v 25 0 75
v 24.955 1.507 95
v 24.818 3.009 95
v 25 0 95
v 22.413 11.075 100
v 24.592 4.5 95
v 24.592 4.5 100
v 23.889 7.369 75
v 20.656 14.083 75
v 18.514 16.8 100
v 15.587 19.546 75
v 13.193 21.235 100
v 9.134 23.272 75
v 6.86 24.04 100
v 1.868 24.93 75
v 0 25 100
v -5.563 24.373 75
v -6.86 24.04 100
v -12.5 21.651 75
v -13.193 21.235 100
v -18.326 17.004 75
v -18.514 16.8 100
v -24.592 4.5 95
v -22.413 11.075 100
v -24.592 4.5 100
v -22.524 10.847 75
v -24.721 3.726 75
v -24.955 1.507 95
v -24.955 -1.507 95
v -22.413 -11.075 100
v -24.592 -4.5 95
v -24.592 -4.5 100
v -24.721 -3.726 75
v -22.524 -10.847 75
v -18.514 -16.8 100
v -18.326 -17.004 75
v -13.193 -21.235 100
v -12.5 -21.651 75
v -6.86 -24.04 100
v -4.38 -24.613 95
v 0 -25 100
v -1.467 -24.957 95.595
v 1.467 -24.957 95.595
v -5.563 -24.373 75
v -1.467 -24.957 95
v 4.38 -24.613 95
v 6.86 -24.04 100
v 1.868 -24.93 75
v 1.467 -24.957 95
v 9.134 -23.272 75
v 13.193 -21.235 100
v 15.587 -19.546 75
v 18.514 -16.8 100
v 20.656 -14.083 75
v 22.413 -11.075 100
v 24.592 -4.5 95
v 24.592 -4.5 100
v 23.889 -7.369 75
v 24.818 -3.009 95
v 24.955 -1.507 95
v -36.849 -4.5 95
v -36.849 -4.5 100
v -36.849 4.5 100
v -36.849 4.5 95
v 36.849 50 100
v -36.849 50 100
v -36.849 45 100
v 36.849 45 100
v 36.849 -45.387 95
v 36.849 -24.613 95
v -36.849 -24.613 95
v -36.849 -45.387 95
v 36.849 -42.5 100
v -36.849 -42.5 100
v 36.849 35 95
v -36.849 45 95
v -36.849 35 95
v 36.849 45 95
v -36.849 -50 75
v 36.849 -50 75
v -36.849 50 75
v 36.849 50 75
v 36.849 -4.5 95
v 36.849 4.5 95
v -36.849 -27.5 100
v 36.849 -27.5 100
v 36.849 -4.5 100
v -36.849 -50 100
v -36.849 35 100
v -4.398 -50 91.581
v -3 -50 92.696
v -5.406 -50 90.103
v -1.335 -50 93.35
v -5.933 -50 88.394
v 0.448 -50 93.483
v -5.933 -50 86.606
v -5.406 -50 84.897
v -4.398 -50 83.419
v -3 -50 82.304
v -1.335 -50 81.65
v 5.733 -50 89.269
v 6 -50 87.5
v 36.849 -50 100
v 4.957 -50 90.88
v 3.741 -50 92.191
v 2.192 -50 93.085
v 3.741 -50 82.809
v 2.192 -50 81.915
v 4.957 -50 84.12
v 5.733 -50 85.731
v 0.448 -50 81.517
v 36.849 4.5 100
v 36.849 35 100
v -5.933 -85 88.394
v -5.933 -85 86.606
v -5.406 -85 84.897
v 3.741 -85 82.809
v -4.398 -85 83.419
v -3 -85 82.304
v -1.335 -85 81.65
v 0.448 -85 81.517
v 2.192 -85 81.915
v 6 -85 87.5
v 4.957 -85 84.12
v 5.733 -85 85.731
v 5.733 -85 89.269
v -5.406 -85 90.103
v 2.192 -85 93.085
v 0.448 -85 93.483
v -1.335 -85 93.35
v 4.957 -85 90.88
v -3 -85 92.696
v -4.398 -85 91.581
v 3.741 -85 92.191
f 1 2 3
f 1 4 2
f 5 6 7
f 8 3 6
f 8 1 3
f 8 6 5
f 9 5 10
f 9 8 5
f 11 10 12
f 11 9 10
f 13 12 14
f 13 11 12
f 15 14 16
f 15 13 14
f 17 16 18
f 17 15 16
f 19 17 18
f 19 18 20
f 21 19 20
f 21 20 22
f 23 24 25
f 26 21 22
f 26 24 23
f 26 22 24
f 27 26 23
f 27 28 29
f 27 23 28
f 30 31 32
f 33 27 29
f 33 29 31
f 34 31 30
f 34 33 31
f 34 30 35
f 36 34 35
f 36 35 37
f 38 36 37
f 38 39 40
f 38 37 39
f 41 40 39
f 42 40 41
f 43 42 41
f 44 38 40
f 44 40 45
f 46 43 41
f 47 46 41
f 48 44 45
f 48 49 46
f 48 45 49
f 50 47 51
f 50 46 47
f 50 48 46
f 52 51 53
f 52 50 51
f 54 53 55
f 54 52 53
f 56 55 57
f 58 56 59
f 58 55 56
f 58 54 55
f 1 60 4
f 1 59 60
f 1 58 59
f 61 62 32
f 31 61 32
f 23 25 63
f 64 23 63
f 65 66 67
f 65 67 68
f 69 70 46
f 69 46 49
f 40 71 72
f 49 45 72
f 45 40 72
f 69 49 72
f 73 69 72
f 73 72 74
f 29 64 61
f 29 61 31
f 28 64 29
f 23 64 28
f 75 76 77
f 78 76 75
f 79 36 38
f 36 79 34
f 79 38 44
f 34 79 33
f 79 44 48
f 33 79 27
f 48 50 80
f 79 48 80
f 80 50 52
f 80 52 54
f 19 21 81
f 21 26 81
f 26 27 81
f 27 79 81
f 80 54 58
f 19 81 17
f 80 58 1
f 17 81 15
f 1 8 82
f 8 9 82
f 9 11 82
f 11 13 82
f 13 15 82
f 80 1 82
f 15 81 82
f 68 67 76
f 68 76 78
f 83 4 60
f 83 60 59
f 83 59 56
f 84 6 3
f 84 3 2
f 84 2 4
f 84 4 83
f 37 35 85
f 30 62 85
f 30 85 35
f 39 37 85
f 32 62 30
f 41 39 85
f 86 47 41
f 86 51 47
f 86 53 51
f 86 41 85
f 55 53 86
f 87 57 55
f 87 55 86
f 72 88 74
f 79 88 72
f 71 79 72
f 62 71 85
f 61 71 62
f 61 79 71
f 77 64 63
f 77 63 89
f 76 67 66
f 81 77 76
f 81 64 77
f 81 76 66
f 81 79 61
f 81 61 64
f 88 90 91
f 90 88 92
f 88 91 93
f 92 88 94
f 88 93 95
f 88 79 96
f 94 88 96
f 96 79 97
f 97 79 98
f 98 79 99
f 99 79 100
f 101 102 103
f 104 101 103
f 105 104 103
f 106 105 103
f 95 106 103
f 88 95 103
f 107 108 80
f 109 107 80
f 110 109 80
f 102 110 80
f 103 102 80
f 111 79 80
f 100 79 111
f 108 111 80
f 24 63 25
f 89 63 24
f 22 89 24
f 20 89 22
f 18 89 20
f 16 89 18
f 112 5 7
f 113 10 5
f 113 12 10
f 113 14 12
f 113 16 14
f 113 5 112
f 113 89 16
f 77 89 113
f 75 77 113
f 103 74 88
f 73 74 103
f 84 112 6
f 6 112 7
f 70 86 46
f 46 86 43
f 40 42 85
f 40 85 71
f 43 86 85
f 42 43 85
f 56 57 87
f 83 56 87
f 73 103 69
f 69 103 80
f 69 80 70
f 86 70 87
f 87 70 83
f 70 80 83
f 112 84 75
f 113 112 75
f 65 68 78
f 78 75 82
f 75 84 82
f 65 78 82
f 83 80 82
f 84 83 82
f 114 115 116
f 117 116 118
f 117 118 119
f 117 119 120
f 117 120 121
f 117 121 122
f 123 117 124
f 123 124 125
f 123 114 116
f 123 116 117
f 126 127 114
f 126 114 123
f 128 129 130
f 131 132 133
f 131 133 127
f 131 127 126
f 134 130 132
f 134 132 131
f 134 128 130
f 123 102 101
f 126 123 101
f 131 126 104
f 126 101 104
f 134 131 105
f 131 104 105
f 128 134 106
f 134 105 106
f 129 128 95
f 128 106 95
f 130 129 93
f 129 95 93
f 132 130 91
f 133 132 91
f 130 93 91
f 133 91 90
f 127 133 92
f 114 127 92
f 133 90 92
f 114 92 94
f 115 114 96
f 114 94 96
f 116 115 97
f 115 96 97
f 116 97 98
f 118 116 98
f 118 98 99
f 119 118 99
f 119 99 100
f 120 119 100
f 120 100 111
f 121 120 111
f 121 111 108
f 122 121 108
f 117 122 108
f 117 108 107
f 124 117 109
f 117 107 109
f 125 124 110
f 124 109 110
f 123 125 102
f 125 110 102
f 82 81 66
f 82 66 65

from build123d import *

# Parameters (mm, degrees)
F1_W      = 73.6989242806
F1_H      = 100
F1_R      = 25
F2_DEPTH  = 100
F3_W      = 73.6989242806
F3_H      = 10
F4_DEPTH  = 5
F6_DEPTH  = 73.6989242806
F0_W      = 73.6989242806
F0_H      = 100
F7_DEPTH  = 75
F8_DEPTH  = 75
F9_R      = 6
F10_DEPTH = 35


with BuildPart() as f2:
    # F1 (on face) → F2 (new body)
    with BuildSketch(Plane.XY):
        Rectangle(F1_W, F1_H)
        Circle(F1_R, mode=Mode.SUBTRACT)
    extrude(amount=F2_DEPTH)

    # F3 (on face) → F4 (cut)
    with BuildSketch(Plane.XY.offset(100)):
        with BuildLine():
            Line((-24.5916652547, 4.5), (-36.8494621403, 4.5))
            Line((-36.8494621403, 4.5), (-36.8494621403, -4.5))
            Line((-36.8494621403, -4.5), (-24.5916652547, -4.5))
            ThreePointArc((-24.5916652547, -4.5), (-25, 0), (-24.5916652547, 4.5))
        make_face()
        with BuildLine():
            Line((36.8494621403, -4.5), (36.8494621403, 4.5))
            Line((36.8494621403, 4.5), (24.5916652547, 4.5))
            ThreePointArc((24.5916652547, 4.5), (24.8977070367, 2.2592441913), (25, 0))
            ThreePointArc((25, 0), (24.8977070367, -2.2592441913), (24.5916652547, -4.5))
            Line((24.5916652547, -4.5), (36.8494621403, -4.5))
        make_face()
        with Locations((0, 40)):
            Rectangle(F3_W, F3_H)
    extrude(amount=-F4_DEPTH, mode=Mode.SUBTRACT)

    # F5 (on face) → F6 (cut, through all)
    with BuildSketch(Plane(origin=(-36.8494621403, 0, 0), x_dir=(0, -1, 0), z_dir=(-1, 0, 0))):
        Polygon((42.5, 100), (27.5, 100), (24.6132486541, 95), (45.3867513459, 95), align=None)
    extrude(amount=-F6_DEPTH, mode=Mode.SUBTRACT)

    # F0 (on Top) → F7 (cut)
    with BuildSketch(Plane.XY):
        Rectangle(F0_W, F0_H)
    extrude(amount=-F7_DEPTH, mode=Mode.SUBTRACT)

    # F8 (cut): a face of the model
    f8_faces = [f2.faces().sort_by_distance(p)[0] for p in [
        (0, -48.7577628471, 0),
    ]]
    extrude(f8_faces, amount=-F8_DEPTH, mode=Mode.SUBTRACT)

    # F9 (on face) → F10 (join)
    with BuildSketch(Plane.XZ.offset(50)):
        with Locations((0, 87.5)):
            Circle(F9_R)
    extrude(amount=F10_DEPTH)


solid = f2.part
